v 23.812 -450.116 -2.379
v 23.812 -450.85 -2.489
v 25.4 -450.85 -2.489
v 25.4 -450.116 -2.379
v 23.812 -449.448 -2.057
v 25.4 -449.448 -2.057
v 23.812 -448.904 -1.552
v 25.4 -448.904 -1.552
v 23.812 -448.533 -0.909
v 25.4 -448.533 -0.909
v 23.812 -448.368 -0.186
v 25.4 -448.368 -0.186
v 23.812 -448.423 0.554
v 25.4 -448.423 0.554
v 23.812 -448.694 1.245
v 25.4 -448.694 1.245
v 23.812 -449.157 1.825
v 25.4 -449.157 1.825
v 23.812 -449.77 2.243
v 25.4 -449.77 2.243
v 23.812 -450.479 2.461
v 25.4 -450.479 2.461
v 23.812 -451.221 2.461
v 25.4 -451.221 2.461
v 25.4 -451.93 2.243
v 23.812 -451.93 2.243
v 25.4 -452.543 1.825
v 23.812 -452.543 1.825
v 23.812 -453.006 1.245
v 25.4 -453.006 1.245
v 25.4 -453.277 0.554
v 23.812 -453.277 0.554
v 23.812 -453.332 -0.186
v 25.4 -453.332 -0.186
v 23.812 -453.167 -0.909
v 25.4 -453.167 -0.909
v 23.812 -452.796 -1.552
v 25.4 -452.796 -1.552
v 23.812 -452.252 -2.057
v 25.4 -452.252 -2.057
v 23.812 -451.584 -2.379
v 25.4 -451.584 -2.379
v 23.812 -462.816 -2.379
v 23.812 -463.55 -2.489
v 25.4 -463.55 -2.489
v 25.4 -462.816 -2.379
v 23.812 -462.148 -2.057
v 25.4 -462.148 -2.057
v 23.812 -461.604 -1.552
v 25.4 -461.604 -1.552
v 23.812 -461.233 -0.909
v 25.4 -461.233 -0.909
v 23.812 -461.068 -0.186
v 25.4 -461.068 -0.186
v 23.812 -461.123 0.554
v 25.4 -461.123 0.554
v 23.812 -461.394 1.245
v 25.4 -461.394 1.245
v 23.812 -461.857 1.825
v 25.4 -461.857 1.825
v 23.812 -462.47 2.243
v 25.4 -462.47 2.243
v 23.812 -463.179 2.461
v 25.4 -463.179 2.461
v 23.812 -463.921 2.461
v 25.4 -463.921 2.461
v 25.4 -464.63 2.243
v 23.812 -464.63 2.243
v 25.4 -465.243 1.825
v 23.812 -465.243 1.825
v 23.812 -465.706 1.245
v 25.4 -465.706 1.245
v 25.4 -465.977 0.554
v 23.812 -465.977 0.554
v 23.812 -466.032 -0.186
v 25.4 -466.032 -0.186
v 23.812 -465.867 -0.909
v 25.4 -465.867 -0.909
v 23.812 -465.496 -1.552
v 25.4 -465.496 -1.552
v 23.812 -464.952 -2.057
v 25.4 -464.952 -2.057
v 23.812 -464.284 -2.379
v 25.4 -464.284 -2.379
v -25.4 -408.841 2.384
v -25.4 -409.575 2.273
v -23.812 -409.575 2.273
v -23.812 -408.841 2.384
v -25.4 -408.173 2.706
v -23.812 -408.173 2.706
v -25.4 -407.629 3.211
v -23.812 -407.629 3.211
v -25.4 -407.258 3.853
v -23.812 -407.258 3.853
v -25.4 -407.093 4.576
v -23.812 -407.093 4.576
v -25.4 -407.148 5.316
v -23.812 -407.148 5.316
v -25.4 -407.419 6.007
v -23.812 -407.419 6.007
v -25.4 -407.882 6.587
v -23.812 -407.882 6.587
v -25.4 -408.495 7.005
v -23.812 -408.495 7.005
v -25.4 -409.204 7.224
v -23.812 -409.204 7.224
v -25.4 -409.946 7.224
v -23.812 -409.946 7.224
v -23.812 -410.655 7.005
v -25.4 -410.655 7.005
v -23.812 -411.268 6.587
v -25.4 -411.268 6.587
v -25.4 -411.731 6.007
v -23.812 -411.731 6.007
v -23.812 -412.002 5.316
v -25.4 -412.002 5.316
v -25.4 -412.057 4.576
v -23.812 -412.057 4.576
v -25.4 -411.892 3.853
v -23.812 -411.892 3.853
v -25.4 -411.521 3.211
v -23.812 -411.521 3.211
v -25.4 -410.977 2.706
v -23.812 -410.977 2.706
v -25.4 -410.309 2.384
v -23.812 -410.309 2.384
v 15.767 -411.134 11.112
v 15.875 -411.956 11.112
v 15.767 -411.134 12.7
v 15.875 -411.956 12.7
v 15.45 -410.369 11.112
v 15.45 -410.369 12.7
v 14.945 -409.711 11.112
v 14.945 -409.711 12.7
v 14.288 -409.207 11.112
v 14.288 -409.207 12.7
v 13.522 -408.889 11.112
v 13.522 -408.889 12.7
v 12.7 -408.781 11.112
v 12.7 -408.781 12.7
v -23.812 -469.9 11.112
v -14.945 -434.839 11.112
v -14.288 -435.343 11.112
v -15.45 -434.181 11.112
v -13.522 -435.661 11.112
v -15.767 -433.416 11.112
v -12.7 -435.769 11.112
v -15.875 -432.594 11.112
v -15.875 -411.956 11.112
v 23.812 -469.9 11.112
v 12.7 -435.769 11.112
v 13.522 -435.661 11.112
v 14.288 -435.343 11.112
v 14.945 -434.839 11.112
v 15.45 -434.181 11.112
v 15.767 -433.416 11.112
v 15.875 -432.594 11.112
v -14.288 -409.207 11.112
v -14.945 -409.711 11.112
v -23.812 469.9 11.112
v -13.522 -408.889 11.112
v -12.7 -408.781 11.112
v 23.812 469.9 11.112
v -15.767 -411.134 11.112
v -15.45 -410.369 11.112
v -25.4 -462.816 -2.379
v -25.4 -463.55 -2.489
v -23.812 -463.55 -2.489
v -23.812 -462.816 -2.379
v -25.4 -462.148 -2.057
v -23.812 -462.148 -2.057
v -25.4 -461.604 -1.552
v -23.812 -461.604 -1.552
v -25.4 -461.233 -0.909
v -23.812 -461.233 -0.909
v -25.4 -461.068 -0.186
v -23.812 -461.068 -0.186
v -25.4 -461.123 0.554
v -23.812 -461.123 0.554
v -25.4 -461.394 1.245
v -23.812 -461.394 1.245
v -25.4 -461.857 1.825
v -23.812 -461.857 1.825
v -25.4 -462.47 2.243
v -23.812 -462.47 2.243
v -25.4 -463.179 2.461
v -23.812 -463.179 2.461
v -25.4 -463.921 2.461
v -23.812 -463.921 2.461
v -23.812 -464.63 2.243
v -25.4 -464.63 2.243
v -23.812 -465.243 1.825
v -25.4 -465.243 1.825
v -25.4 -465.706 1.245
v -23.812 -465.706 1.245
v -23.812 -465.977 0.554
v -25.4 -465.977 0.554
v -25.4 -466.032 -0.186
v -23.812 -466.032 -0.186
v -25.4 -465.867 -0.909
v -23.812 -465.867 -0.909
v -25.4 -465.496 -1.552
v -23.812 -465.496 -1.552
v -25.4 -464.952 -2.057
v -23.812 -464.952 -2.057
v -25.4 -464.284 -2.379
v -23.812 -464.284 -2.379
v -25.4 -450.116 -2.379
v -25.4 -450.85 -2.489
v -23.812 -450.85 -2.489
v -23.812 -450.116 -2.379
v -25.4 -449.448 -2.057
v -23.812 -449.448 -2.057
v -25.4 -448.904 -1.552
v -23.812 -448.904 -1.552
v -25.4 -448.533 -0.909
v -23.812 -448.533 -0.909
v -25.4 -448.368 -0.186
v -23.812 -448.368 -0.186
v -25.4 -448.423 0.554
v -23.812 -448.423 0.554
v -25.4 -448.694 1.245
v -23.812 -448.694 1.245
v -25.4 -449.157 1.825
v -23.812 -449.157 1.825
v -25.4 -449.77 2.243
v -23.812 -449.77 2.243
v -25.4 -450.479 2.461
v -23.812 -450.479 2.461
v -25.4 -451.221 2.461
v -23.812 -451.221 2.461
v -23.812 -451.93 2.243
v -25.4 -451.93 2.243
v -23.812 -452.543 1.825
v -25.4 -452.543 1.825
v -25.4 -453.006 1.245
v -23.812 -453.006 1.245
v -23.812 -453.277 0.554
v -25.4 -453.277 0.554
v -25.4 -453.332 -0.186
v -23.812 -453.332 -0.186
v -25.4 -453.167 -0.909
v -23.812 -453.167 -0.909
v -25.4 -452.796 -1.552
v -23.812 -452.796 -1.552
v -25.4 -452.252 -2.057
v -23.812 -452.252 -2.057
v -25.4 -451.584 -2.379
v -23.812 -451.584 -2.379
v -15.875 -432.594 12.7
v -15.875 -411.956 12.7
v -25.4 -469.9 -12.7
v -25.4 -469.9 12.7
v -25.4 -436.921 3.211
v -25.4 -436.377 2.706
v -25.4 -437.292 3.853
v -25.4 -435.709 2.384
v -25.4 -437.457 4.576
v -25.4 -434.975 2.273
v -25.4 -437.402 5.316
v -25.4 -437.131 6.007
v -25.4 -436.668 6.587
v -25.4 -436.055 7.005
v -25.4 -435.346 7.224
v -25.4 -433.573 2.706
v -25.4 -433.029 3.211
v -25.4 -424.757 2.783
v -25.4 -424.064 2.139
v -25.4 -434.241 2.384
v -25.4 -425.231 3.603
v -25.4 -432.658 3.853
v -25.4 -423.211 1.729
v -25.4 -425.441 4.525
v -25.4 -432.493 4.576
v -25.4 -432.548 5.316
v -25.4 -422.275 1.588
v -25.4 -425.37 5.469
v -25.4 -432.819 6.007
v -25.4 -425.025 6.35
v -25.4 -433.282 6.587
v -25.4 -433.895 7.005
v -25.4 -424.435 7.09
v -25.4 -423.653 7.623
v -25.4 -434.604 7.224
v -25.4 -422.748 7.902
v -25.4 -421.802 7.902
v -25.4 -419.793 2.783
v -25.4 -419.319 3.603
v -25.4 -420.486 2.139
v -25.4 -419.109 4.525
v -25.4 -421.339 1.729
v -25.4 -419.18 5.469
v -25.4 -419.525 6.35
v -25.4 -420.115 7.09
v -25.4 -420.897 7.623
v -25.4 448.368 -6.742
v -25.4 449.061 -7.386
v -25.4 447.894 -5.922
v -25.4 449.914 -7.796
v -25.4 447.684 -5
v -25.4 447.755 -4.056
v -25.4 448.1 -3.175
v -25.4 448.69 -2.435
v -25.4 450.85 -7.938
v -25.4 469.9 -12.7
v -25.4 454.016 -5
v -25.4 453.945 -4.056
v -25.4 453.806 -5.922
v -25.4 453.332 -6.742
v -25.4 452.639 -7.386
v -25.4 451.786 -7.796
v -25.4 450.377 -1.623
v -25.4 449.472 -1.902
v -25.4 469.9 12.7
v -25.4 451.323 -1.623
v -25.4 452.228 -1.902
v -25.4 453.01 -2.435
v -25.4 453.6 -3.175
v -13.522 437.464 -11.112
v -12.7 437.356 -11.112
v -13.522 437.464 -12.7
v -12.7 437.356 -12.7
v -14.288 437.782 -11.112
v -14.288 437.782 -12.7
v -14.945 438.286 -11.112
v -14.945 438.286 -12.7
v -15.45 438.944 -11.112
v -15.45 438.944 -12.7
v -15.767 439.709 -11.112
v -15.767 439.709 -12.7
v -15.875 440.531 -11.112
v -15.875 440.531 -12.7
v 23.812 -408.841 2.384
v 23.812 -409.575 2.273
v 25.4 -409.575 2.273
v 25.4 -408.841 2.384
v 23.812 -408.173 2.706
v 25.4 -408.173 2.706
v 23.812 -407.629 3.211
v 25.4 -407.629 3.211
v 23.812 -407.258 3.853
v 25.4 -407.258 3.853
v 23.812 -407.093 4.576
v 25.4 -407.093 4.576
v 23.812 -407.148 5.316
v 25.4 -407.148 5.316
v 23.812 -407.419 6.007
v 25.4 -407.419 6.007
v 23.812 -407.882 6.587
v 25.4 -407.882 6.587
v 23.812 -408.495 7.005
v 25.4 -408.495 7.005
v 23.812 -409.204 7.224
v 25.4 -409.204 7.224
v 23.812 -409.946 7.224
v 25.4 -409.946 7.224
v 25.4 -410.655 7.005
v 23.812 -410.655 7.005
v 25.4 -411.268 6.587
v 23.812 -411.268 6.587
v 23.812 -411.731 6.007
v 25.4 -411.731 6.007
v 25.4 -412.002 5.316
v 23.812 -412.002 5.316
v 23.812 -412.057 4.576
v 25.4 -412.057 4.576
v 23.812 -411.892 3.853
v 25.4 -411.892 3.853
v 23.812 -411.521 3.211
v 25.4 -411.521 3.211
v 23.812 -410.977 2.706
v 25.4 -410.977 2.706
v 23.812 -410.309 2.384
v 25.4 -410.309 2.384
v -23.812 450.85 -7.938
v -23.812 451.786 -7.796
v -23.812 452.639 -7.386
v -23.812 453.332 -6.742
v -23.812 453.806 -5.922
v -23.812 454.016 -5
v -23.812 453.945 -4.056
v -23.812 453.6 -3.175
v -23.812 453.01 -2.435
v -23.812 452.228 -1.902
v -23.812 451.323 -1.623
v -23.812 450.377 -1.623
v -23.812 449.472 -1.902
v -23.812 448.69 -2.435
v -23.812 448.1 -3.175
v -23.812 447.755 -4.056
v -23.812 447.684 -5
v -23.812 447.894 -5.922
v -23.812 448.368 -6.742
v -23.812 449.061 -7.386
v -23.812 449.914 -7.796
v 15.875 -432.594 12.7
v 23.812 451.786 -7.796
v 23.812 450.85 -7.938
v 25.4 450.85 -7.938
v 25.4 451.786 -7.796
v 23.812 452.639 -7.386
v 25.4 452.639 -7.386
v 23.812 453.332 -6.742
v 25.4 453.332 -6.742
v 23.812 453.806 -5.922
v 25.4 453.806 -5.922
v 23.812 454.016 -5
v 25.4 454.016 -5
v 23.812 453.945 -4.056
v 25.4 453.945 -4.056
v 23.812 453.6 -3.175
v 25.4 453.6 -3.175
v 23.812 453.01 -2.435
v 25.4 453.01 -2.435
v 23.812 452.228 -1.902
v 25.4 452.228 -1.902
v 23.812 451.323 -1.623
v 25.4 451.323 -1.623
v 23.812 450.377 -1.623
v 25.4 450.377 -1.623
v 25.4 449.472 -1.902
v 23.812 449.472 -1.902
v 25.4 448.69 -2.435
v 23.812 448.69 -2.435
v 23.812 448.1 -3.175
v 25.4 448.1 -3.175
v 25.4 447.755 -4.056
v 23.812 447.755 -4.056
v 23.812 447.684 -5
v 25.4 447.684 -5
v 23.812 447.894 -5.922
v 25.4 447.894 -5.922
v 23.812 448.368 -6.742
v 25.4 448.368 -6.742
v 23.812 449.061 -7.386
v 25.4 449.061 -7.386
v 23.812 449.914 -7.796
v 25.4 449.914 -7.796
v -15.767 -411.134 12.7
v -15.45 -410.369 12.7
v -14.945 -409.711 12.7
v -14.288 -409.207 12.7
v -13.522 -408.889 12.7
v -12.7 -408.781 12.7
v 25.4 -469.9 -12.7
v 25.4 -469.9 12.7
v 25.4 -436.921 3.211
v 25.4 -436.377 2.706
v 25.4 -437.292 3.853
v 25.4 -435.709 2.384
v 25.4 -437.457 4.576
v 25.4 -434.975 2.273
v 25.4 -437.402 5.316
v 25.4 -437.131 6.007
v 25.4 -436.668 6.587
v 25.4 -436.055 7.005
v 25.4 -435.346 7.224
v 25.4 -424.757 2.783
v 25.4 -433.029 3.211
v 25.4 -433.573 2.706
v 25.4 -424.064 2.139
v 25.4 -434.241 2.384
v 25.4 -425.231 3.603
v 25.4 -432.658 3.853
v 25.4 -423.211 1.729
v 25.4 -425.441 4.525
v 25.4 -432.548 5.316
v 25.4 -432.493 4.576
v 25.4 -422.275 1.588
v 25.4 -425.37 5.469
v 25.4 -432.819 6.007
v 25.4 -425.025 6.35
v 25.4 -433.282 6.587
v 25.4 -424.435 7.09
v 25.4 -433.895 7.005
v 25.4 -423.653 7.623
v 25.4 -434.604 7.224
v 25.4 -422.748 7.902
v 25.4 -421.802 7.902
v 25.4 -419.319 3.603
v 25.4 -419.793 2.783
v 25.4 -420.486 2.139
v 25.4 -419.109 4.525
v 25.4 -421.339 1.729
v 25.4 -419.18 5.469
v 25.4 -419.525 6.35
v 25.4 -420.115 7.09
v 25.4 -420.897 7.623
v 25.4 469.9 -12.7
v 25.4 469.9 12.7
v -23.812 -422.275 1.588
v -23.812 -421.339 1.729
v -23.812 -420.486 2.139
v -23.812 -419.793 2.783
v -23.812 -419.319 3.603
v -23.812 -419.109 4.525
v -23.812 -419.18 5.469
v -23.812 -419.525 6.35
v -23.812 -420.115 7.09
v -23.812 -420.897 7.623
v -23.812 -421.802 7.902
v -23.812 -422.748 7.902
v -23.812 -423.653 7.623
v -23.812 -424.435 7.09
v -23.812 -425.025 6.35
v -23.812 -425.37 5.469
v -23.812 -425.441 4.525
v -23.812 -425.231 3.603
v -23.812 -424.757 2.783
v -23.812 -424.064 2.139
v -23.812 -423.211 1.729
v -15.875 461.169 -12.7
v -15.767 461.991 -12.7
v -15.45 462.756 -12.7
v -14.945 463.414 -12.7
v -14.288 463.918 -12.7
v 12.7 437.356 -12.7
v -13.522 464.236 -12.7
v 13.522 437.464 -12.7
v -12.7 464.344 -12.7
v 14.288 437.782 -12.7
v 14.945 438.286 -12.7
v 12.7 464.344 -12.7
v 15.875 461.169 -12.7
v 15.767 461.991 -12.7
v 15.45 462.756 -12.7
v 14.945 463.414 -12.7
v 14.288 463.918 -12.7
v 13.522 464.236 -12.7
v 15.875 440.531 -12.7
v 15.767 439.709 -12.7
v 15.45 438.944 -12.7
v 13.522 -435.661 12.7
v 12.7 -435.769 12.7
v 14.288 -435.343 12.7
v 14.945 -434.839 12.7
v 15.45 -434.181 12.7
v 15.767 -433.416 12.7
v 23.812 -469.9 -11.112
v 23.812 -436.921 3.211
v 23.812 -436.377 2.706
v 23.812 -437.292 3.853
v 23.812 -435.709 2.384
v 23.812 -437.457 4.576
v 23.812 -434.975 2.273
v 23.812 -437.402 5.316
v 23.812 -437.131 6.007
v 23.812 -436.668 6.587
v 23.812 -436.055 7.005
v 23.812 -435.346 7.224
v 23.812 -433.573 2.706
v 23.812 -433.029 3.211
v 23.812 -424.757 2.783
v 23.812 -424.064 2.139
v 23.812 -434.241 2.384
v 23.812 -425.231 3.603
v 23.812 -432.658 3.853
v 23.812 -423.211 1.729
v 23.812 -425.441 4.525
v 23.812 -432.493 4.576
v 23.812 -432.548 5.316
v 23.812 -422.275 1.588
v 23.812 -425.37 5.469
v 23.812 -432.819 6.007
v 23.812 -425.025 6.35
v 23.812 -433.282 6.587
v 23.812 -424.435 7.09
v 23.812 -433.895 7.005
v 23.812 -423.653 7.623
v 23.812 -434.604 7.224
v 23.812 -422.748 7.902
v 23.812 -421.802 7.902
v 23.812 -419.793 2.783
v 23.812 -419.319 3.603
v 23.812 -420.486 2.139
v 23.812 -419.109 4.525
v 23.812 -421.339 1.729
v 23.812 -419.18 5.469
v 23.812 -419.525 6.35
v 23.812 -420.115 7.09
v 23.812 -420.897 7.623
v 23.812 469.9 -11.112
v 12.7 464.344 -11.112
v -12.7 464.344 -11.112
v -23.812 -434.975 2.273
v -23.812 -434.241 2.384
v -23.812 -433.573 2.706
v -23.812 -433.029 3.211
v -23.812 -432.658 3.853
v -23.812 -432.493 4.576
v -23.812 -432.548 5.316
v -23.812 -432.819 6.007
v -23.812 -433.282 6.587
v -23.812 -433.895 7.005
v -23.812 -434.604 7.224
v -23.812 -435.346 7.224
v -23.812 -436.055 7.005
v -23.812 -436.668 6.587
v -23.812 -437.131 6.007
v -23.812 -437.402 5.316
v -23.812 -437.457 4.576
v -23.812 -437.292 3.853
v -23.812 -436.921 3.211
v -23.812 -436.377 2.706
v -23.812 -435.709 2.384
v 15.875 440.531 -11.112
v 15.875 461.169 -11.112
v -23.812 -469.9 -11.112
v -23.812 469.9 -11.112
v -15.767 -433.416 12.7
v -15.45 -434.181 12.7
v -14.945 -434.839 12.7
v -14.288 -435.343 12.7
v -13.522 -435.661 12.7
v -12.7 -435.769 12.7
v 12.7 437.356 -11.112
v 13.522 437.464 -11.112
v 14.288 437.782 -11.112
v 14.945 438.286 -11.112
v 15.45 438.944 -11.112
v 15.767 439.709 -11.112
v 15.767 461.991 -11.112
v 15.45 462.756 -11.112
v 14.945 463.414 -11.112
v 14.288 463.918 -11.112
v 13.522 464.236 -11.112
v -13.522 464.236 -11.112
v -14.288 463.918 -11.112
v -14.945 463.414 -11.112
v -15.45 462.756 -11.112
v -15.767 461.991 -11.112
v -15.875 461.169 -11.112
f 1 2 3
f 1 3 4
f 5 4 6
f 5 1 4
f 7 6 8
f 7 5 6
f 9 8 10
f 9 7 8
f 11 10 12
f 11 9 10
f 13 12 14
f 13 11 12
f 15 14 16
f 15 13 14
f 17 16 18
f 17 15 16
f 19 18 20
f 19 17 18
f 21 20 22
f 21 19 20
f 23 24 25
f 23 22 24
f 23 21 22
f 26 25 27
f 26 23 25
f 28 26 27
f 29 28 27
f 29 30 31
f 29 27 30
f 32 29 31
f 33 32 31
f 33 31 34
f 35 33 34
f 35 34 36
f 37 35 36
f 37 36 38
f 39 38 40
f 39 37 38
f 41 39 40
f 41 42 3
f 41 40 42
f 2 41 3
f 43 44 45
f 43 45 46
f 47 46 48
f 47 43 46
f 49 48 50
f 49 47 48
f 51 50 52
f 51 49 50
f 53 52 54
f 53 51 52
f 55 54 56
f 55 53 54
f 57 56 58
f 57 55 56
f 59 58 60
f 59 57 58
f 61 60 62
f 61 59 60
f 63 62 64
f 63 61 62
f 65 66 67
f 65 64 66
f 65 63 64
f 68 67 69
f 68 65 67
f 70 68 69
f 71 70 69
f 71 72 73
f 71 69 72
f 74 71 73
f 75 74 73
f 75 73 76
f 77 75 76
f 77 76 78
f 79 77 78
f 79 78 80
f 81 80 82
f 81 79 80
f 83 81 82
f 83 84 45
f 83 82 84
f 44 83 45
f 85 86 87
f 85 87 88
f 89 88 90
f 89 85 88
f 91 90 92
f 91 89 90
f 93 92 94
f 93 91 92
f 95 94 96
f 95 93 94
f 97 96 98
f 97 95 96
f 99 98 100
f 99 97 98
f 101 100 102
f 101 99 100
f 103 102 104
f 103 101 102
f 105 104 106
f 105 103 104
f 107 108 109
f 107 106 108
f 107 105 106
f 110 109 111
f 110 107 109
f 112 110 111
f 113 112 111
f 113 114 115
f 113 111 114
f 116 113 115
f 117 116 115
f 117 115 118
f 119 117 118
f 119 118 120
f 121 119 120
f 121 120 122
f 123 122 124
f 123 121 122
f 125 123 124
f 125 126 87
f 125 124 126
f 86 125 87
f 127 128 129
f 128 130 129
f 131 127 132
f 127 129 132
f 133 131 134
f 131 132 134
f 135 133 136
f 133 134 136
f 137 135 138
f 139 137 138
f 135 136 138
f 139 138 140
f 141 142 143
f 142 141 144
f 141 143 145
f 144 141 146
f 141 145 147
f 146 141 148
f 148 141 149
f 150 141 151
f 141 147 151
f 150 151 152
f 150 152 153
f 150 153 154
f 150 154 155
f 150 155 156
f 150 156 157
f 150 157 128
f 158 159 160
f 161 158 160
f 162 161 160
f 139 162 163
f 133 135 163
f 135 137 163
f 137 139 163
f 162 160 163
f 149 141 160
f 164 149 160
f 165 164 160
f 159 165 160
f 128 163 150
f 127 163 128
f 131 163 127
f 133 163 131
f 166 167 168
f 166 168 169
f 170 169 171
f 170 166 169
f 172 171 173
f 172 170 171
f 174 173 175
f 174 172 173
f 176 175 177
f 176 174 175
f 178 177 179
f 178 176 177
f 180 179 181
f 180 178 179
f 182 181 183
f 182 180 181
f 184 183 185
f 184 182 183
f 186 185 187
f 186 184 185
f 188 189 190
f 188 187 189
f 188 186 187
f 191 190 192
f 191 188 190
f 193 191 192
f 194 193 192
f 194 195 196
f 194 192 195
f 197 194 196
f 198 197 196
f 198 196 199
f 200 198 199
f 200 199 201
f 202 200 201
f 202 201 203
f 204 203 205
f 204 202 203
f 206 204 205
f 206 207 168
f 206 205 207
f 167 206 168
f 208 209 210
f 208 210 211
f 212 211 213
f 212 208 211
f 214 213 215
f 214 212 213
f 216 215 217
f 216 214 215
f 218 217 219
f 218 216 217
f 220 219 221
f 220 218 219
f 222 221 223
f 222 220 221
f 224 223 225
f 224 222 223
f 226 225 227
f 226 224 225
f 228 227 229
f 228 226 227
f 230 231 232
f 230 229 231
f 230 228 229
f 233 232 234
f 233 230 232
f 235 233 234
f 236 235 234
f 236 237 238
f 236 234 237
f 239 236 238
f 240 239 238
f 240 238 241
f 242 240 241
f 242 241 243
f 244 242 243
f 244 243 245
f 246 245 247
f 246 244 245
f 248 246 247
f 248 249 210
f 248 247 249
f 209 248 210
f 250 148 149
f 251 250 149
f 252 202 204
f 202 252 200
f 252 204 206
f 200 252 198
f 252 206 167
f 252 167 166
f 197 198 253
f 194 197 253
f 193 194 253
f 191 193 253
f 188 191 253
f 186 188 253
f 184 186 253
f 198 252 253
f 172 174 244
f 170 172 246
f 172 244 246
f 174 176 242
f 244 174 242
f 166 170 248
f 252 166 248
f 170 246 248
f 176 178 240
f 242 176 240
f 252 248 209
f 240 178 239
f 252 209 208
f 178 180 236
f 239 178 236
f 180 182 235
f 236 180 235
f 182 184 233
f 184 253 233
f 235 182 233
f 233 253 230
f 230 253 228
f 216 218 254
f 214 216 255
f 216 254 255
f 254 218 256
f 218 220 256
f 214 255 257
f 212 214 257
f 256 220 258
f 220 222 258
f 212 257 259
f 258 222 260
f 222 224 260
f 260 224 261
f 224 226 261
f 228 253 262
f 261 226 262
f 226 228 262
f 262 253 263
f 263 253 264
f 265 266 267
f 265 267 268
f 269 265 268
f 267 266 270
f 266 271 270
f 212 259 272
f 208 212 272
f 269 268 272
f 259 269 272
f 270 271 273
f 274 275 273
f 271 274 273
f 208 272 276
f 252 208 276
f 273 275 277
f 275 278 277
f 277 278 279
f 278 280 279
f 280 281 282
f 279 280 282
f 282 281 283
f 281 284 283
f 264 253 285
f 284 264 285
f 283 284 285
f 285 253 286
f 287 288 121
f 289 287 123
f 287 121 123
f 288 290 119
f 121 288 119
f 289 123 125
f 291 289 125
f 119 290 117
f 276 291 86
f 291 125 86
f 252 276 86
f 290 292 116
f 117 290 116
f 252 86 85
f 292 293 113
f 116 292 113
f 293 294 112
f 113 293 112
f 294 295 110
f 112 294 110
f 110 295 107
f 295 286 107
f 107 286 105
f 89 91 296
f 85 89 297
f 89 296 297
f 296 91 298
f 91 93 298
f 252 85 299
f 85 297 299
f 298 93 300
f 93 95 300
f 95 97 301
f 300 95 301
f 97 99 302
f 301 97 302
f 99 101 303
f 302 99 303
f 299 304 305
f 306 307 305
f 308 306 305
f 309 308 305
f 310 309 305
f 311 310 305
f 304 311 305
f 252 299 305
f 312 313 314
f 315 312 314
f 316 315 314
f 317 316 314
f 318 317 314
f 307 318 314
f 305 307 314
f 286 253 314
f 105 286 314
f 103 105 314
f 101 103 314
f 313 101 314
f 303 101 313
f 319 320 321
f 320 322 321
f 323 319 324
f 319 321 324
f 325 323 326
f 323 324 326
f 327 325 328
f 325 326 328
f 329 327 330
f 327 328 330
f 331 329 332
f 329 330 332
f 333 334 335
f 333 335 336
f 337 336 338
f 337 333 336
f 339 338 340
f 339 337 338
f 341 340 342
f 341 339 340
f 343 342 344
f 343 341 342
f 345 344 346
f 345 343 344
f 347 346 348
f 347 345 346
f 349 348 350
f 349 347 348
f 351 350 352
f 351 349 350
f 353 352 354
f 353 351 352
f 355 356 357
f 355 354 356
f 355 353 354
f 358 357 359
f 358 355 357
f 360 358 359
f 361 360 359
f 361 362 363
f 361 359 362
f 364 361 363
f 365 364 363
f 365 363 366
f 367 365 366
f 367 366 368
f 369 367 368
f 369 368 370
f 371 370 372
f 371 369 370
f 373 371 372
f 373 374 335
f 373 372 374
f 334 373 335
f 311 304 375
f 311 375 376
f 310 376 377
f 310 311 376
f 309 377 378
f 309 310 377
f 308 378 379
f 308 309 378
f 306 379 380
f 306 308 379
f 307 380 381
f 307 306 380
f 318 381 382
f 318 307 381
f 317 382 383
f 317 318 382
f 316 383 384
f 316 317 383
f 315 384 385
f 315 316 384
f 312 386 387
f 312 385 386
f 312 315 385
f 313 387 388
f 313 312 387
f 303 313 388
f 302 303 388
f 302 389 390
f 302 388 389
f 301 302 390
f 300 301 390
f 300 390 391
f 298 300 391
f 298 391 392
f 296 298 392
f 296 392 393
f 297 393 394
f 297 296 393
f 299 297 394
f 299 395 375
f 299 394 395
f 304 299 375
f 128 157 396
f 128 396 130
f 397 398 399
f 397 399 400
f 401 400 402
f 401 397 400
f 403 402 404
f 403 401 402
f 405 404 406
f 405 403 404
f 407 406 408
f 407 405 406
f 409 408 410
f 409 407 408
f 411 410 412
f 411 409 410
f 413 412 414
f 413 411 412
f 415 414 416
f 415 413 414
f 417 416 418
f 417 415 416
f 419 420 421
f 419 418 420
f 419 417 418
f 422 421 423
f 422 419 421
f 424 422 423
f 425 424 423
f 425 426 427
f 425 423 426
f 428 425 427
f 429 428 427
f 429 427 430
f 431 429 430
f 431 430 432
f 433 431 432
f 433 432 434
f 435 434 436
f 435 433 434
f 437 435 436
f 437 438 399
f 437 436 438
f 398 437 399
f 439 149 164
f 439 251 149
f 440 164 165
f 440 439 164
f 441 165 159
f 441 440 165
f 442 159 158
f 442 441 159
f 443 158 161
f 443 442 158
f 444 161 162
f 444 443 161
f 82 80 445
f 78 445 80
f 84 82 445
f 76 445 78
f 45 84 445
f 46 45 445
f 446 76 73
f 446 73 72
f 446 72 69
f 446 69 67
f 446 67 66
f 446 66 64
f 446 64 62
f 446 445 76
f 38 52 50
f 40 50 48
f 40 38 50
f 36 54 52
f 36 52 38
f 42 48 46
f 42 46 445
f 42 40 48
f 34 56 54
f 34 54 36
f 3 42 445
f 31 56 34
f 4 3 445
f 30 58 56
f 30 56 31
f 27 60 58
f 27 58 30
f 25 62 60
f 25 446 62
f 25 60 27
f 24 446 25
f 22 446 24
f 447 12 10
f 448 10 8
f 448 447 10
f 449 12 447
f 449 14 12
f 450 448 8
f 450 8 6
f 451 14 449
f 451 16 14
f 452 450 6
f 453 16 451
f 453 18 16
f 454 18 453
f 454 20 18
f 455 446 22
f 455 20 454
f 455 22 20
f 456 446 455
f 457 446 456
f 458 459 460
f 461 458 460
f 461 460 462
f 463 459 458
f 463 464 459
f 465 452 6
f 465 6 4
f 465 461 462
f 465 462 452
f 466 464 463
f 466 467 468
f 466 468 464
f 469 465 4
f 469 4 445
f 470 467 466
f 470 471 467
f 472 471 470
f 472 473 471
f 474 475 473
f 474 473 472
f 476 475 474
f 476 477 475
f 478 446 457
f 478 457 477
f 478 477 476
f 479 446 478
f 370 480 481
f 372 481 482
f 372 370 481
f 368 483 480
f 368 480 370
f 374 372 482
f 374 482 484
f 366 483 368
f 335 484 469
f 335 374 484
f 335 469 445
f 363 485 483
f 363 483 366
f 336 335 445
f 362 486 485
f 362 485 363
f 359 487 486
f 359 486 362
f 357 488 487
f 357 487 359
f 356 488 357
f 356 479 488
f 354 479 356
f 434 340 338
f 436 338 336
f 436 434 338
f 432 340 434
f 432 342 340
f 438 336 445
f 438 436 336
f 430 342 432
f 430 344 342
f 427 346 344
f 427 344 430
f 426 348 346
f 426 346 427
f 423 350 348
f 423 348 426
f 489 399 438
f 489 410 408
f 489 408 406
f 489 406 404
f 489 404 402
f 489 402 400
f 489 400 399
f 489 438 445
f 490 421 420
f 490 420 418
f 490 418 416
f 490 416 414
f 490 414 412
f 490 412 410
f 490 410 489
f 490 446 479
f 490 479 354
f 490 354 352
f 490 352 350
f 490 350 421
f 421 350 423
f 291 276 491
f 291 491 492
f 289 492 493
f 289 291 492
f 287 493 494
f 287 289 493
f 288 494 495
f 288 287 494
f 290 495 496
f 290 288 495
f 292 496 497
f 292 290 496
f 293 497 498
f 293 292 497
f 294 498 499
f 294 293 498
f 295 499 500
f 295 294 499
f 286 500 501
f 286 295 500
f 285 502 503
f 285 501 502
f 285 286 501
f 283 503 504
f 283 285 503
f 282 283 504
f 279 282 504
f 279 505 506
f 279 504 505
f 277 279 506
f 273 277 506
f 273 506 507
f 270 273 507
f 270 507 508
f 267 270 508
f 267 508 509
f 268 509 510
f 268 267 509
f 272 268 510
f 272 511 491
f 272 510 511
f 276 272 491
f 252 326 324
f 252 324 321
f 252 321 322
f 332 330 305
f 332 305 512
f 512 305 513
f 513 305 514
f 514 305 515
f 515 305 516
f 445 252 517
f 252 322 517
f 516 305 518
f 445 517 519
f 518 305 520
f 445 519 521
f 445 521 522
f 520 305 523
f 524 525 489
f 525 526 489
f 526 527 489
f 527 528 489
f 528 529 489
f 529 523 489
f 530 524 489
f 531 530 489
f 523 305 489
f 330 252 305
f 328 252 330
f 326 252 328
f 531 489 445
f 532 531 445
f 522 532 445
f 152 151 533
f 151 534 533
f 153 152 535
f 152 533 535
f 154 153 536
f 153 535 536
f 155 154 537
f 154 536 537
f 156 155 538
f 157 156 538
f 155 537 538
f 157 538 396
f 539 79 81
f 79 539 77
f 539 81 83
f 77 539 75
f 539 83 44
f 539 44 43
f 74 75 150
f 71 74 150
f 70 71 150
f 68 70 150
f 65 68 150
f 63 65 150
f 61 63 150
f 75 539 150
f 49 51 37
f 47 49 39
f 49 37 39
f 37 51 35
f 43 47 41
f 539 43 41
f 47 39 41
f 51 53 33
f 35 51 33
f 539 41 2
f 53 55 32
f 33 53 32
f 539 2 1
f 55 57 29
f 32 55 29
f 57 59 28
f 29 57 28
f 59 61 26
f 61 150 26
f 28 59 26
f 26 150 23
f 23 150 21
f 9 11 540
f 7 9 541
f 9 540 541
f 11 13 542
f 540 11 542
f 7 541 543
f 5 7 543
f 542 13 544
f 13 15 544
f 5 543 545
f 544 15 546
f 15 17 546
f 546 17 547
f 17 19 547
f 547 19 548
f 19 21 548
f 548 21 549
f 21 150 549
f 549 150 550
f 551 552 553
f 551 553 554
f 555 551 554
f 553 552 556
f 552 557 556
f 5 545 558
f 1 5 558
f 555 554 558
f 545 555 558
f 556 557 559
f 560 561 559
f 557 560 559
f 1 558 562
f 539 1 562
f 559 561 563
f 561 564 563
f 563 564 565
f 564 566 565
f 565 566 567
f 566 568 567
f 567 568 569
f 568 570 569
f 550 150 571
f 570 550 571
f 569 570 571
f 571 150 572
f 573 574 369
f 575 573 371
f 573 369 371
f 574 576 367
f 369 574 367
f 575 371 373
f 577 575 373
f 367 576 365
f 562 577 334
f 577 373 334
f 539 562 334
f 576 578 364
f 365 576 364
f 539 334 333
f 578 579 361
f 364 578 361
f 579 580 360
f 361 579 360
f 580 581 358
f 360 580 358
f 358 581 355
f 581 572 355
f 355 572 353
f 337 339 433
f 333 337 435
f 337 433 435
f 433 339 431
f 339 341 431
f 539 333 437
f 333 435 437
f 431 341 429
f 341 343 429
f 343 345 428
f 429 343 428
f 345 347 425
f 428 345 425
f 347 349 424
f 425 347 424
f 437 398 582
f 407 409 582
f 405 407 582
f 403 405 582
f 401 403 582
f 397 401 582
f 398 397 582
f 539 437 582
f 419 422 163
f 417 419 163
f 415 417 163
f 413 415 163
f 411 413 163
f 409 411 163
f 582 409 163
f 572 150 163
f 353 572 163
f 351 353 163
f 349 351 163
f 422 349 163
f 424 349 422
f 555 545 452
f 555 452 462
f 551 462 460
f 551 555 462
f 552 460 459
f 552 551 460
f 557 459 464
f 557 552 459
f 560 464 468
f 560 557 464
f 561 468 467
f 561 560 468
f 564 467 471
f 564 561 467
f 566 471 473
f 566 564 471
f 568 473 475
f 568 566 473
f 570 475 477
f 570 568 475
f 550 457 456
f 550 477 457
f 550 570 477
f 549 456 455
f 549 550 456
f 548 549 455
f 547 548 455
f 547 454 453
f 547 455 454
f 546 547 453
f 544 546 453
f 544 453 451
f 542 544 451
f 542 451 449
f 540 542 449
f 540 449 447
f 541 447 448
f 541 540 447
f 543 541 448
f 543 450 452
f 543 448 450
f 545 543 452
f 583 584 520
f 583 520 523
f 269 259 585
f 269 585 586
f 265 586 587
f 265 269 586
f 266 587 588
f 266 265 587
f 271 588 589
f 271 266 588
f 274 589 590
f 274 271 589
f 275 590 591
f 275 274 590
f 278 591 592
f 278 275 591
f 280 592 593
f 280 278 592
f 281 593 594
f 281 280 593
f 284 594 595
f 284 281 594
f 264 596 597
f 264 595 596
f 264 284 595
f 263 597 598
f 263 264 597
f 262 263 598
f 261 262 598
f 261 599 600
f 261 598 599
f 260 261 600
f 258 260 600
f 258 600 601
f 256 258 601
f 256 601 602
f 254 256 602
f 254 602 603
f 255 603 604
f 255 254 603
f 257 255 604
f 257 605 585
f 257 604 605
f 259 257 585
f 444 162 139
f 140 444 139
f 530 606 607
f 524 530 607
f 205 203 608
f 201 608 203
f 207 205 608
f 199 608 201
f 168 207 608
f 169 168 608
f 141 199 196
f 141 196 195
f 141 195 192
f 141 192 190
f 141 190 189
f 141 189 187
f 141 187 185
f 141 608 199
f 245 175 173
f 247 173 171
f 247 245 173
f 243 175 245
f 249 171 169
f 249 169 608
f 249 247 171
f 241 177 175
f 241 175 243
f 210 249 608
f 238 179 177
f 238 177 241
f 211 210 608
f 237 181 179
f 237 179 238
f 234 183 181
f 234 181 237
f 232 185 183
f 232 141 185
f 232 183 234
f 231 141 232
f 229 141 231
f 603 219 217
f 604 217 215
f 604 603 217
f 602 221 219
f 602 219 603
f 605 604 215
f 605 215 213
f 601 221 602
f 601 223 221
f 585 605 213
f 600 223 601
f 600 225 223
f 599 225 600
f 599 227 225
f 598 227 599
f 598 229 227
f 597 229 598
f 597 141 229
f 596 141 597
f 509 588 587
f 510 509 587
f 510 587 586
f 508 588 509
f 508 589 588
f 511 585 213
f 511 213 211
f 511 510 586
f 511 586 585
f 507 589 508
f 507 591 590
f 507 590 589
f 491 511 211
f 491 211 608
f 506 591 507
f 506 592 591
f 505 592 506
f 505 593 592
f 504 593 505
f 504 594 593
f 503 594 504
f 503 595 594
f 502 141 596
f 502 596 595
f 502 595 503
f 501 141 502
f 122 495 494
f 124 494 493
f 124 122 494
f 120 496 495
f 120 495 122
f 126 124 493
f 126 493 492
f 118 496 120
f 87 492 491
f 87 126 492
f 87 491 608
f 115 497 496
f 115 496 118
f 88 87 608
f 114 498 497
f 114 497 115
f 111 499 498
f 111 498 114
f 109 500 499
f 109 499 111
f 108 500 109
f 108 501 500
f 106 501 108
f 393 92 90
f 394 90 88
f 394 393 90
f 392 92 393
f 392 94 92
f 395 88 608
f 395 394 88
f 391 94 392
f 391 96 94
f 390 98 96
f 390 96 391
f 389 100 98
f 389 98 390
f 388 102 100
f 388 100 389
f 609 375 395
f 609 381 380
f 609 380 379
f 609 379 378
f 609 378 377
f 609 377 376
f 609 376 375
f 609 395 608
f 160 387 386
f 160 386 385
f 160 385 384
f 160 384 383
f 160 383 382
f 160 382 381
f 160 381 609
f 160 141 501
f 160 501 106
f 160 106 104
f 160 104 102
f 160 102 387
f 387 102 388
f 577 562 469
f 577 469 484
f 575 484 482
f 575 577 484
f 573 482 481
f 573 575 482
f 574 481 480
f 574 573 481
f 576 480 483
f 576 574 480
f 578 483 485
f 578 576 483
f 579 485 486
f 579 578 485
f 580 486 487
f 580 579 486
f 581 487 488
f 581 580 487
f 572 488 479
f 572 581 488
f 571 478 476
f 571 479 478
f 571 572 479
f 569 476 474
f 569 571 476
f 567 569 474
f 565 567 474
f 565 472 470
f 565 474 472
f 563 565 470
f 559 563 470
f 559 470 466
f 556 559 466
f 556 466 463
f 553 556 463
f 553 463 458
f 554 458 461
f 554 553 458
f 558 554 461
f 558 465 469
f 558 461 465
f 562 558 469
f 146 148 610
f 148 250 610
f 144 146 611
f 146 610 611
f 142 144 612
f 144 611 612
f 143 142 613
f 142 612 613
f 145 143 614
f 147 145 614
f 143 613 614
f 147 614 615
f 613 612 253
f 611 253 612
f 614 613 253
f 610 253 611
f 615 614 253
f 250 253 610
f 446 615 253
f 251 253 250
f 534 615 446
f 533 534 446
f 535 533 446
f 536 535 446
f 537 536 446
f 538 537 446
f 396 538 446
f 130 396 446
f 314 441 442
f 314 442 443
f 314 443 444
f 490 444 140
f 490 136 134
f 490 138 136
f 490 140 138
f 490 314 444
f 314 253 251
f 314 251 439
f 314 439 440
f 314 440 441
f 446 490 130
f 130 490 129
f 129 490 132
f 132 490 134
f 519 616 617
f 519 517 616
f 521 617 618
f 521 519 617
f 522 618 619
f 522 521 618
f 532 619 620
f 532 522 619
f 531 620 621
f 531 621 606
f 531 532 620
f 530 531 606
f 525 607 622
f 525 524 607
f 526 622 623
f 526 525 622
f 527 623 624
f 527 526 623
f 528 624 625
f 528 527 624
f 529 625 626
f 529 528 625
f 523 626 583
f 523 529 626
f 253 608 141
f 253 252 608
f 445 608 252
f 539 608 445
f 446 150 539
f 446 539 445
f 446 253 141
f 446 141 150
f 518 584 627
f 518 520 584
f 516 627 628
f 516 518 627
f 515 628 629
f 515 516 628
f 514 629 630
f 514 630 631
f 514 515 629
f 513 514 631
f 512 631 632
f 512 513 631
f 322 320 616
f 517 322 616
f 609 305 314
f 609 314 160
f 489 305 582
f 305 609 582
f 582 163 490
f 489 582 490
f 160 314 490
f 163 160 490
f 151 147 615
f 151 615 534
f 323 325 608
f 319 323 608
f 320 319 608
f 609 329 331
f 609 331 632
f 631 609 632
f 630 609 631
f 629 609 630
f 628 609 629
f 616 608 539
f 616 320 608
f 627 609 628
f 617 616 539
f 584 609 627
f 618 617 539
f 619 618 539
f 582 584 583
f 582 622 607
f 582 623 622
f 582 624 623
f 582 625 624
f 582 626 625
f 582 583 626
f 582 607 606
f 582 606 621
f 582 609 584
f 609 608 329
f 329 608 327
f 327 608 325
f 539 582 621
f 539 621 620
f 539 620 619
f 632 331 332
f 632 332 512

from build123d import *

# Parameters (mm, degrees)
SKETCH1_W               = 50.8
SKETCH1_H               = 939.8
BOSS_EXTRUDE1_DEPTH     = 12.7
SHELL1_T                = -1.5875
CUT_EXTRUDE1_DEPTH      = 471.757326018
CUT_EXTRUDE1_DEPTH_BACK = 471.757326018
SKETCH3_R               = 2.4892
CUT_EXTRUDE2_DEPTH      = 471.757326018
CUT_EXTRUDE2_DEPTH_BACK = 471.757326018
SKETCH4_R               = 3.175
SKETCH4_R_2             = 2.4892
SKETCH5_W               = 31.75
SKETCH5_H               = 26.9875
CUT_EXTRUDE3_DEPTH      = 471.757326018
FILLET1_R               = 3.175
CUT_EXTRUDE4_DEPTH      = 471.757326018
CUT_EXTRUDE4_DEPTH_BACK = 471.757326018
SKETCH6_R               = 3.175
SKETCH7_W               = 31.75
SKETCH7_H               = 26.9875
CUT_EXTRUDE5_DEPTH      = 471.757326018
FILLET2_R               = 3.175


with BuildPart() as part:
    # Sketch1 → Boss-Extrude1 (new, symmetric)
    with BuildSketch(Plane.XY):
        Rectangle(SKETCH1_W, SKETCH1_H)
    extrude(amount=BOSS_EXTRUDE1_DEPTH, both=True)

    # Shell1
    shell1_openings = [part.faces().sort_by_distance(p)[0] for p in [
        (0, -469.9, 0),
        (0, 469.9, 0),
    ]]
    offset(amount=SHELL1_T, openings=shell1_openings, kind=Kind.INTERSECTION)

    # Sketch3 → Cut-Extrude1 (cut, two sides: drawn at the far end of the back side and taken through both)
    with BuildSketch(Plane(origin=(0, 0, 0), x_dir=(0, 0, -1), z_dir=(1, 0, 0)).offset(-CUT_EXTRUDE1_DEPTH_BACK)):
        with Locations((0, -463.55)):
            Circle(SKETCH3_R)
        with Locations((0, -450.85)):
            Circle(SKETCH3_R)
    extrude(amount=CUT_EXTRUDE1_DEPTH + CUT_EXTRUDE1_DEPTH_BACK, mode=Mode.SUBTRACT)

    # Sketch4 → Cut-Extrude2 (cut, two sides: drawn at the far end of the back side and taken through both)
    with BuildSketch(Plane(origin=(0, 0, 0), x_dir=(0, 0, -1), z_dir=(1, 0, 0)).offset(-CUT_EXTRUDE2_DEPTH_BACK)):
        with Locations((-4.7625, -422.275)):
            Circle(SKETCH4_R)
        with Locations((-4.7625, -409.575)):
            Circle(SKETCH4_R_2)
        with Locations((-4.7625, -434.975)):
            Circle(SKETCH4_R_2)
    extrude(amount=CUT_EXTRUDE2_DEPTH + CUT_EXTRUDE2_DEPTH_BACK, mode=Mode.SUBTRACT)

    # Sketch5 → Cut-Extrude3 (cut, through all)
    with BuildSketch(Plane.XY):
        with Locations((0, -422.275)):
            Rectangle(SKETCH5_W, SKETCH5_H)
    extrude(amount=CUT_EXTRUDE3_DEPTH, mode=Mode.SUBTRACT)

    # Fillet1
    fillet1_edges = [part.edges().sort_by_distance(p)[0] for p in [
        (-15.875, -408.78125, 11.90625),
        (-15.875, -435.76875, 11.90625),
        (15.875, -435.76875, 11.90625),
        (15.875, -408.78125, 11.90625),
    ]]
    fillet(fillet1_edges, radius=FILLET1_R)

    # Sketch6 → Cut-Extrude4 (cut, two sides: drawn at the far end of the back side and taken through both)
    with BuildSketch(Plane(origin=(0, 0, 0), x_dir=(0, 0, -1), z_dir=(1, 0, 0)).offset(-CUT_EXTRUDE4_DEPTH_BACK)):
        with Locations((4.7625, 450.85)):
            Circle(SKETCH6_R)
    extrude(amount=CUT_EXTRUDE4_DEPTH + CUT_EXTRUDE4_DEPTH_BACK, mode=Mode.SUBTRACT)

    # Sketch7 → Cut-Extrude5 (cut, through all)
    with BuildSketch(Plane.XY):
        with Locations((0, 450.85)):
            Rectangle(SKETCH7_W, SKETCH7_H)
    extrude(amount=-CUT_EXTRUDE5_DEPTH, mode=Mode.SUBTRACT)

    # Fillet2
    fillet2_edges = [part.edges().sort_by_distance(p)[0] for p in [
        (15.875, 464.34375, -11.90625),
        (15.875, 437.35625, -11.90625),
        (-15.875, 437.35625, -11.90625),
        (-15.875, 464.34375, -11.90625),
    ]]
    fillet(fillet2_edges, radius=FILLET2_R)


solid = part.part
